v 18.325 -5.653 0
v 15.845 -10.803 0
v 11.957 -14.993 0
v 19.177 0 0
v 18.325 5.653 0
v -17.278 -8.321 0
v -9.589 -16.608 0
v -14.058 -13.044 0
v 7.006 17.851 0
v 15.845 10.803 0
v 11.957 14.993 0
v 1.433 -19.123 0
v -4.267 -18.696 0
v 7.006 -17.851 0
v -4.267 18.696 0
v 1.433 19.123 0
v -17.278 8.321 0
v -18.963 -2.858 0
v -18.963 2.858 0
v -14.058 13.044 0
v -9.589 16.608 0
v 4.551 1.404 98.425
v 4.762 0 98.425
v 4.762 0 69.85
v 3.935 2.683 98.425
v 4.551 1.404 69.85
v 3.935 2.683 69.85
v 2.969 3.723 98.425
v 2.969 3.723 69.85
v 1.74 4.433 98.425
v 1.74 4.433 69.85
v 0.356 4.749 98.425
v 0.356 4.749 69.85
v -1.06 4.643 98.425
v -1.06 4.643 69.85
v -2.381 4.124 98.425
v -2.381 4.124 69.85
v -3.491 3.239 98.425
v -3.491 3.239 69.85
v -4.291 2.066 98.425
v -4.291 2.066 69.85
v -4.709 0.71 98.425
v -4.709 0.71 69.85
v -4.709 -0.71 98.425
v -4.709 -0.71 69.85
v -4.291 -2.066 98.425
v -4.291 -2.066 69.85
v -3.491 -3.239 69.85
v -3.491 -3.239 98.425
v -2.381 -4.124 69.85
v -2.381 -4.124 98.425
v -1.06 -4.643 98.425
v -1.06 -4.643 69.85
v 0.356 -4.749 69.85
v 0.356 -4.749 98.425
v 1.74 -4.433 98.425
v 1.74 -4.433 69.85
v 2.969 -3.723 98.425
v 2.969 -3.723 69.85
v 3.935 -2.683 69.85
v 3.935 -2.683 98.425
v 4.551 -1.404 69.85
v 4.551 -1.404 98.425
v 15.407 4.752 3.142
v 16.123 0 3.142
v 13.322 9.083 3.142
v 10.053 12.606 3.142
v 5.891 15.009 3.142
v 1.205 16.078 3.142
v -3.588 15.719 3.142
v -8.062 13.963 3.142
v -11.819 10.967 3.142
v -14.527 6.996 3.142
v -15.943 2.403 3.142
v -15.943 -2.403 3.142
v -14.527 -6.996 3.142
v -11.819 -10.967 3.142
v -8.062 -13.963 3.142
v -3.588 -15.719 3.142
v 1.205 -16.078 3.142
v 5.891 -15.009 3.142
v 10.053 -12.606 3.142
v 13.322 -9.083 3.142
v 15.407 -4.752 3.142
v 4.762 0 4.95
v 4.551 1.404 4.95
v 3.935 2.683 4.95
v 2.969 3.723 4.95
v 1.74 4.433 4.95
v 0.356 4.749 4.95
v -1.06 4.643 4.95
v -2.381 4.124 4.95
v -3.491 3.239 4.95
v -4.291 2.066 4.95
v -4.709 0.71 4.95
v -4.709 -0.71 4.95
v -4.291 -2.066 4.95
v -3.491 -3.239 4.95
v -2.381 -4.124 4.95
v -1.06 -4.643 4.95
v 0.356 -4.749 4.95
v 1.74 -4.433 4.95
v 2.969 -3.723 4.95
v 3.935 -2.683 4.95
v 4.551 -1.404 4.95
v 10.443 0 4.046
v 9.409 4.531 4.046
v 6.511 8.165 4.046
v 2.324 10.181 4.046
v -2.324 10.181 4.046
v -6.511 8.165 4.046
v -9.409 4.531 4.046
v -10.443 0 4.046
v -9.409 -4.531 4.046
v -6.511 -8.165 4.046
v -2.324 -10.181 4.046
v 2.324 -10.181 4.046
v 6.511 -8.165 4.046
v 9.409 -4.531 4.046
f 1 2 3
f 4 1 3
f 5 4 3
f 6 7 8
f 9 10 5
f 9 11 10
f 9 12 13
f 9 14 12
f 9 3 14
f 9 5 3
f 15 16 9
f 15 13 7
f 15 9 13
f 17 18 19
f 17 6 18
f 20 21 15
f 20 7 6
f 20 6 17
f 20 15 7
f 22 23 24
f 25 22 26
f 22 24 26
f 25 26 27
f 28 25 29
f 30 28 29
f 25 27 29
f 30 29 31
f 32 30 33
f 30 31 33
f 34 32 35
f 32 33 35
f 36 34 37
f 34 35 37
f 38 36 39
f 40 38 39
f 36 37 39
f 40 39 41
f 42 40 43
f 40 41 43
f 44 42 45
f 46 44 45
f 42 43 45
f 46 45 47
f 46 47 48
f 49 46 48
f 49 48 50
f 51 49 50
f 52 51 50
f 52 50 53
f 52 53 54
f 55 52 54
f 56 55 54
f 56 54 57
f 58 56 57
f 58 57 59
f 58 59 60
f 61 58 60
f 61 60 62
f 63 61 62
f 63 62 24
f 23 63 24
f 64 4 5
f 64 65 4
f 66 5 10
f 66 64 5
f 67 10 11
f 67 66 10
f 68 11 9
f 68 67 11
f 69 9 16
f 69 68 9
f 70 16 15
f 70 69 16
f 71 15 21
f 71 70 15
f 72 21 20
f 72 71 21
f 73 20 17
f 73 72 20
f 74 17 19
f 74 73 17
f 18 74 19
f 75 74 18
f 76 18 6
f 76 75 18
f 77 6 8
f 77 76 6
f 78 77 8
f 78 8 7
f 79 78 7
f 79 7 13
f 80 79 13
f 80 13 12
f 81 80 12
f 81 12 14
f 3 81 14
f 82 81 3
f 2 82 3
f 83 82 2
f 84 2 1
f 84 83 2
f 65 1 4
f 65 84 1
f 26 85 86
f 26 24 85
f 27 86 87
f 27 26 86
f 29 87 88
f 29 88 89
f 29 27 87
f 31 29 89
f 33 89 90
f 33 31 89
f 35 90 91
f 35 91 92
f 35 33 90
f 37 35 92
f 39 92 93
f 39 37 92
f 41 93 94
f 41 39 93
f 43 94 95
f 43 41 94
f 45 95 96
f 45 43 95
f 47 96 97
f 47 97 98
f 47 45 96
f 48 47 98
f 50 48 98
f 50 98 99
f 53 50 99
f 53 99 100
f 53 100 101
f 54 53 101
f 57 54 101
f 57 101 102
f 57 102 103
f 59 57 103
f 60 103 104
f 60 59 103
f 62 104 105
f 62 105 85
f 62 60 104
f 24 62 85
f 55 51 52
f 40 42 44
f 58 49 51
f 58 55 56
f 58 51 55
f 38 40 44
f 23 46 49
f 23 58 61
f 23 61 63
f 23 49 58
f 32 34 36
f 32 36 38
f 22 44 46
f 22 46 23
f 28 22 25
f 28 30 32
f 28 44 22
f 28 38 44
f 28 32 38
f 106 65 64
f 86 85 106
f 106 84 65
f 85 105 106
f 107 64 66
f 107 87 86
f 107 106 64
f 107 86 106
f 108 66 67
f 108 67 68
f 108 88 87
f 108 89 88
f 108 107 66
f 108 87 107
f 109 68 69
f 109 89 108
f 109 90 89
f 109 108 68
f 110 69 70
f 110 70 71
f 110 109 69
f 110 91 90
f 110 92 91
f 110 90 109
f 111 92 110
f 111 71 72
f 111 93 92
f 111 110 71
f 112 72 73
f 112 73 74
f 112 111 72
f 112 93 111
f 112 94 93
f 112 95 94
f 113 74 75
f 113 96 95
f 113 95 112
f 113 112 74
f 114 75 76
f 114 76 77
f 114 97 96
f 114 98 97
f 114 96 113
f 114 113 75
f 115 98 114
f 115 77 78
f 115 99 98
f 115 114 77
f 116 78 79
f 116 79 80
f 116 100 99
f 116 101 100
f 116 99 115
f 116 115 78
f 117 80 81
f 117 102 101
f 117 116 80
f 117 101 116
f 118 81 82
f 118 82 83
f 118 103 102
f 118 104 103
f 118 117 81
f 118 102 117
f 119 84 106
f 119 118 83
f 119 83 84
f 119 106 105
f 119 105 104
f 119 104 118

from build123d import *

# Parameters (mm, degrees)
F3_DEPTH = 50.8
F4_DEPTH = 22.225


with BuildPart() as f2:
    # F1 (on Front) → F2 (revolve)
    with BuildSketch(Plane.XZ):
        Polygon((0, 69.85), (0, 0), (19.177, 0), (16.1234308034, 3.1421328895), (4.7625, 4.9503548071), (4.7625, 69.85), align=None)
    revolve(axis=Axis((0, 0, 0), (0, 0, 1)))

    # F3 (add): a face of the model
    f3_faces = [f2.faces().sort_by_distance(p)[0] for p in [
        (0, 0, 69.85),
    ]]
    extrude(f3_faces, amount=F3_DEPTH)

    # F4 (cut): a face of the model
    f4_faces = [f2.faces().sort_by_distance(p)[0] for p in [
        (0, 0, 120.65),
    ]]
    extrude(f4_faces, amount=-F4_DEPTH, mode=Mode.SUBTRACT)


solid = f2.part
